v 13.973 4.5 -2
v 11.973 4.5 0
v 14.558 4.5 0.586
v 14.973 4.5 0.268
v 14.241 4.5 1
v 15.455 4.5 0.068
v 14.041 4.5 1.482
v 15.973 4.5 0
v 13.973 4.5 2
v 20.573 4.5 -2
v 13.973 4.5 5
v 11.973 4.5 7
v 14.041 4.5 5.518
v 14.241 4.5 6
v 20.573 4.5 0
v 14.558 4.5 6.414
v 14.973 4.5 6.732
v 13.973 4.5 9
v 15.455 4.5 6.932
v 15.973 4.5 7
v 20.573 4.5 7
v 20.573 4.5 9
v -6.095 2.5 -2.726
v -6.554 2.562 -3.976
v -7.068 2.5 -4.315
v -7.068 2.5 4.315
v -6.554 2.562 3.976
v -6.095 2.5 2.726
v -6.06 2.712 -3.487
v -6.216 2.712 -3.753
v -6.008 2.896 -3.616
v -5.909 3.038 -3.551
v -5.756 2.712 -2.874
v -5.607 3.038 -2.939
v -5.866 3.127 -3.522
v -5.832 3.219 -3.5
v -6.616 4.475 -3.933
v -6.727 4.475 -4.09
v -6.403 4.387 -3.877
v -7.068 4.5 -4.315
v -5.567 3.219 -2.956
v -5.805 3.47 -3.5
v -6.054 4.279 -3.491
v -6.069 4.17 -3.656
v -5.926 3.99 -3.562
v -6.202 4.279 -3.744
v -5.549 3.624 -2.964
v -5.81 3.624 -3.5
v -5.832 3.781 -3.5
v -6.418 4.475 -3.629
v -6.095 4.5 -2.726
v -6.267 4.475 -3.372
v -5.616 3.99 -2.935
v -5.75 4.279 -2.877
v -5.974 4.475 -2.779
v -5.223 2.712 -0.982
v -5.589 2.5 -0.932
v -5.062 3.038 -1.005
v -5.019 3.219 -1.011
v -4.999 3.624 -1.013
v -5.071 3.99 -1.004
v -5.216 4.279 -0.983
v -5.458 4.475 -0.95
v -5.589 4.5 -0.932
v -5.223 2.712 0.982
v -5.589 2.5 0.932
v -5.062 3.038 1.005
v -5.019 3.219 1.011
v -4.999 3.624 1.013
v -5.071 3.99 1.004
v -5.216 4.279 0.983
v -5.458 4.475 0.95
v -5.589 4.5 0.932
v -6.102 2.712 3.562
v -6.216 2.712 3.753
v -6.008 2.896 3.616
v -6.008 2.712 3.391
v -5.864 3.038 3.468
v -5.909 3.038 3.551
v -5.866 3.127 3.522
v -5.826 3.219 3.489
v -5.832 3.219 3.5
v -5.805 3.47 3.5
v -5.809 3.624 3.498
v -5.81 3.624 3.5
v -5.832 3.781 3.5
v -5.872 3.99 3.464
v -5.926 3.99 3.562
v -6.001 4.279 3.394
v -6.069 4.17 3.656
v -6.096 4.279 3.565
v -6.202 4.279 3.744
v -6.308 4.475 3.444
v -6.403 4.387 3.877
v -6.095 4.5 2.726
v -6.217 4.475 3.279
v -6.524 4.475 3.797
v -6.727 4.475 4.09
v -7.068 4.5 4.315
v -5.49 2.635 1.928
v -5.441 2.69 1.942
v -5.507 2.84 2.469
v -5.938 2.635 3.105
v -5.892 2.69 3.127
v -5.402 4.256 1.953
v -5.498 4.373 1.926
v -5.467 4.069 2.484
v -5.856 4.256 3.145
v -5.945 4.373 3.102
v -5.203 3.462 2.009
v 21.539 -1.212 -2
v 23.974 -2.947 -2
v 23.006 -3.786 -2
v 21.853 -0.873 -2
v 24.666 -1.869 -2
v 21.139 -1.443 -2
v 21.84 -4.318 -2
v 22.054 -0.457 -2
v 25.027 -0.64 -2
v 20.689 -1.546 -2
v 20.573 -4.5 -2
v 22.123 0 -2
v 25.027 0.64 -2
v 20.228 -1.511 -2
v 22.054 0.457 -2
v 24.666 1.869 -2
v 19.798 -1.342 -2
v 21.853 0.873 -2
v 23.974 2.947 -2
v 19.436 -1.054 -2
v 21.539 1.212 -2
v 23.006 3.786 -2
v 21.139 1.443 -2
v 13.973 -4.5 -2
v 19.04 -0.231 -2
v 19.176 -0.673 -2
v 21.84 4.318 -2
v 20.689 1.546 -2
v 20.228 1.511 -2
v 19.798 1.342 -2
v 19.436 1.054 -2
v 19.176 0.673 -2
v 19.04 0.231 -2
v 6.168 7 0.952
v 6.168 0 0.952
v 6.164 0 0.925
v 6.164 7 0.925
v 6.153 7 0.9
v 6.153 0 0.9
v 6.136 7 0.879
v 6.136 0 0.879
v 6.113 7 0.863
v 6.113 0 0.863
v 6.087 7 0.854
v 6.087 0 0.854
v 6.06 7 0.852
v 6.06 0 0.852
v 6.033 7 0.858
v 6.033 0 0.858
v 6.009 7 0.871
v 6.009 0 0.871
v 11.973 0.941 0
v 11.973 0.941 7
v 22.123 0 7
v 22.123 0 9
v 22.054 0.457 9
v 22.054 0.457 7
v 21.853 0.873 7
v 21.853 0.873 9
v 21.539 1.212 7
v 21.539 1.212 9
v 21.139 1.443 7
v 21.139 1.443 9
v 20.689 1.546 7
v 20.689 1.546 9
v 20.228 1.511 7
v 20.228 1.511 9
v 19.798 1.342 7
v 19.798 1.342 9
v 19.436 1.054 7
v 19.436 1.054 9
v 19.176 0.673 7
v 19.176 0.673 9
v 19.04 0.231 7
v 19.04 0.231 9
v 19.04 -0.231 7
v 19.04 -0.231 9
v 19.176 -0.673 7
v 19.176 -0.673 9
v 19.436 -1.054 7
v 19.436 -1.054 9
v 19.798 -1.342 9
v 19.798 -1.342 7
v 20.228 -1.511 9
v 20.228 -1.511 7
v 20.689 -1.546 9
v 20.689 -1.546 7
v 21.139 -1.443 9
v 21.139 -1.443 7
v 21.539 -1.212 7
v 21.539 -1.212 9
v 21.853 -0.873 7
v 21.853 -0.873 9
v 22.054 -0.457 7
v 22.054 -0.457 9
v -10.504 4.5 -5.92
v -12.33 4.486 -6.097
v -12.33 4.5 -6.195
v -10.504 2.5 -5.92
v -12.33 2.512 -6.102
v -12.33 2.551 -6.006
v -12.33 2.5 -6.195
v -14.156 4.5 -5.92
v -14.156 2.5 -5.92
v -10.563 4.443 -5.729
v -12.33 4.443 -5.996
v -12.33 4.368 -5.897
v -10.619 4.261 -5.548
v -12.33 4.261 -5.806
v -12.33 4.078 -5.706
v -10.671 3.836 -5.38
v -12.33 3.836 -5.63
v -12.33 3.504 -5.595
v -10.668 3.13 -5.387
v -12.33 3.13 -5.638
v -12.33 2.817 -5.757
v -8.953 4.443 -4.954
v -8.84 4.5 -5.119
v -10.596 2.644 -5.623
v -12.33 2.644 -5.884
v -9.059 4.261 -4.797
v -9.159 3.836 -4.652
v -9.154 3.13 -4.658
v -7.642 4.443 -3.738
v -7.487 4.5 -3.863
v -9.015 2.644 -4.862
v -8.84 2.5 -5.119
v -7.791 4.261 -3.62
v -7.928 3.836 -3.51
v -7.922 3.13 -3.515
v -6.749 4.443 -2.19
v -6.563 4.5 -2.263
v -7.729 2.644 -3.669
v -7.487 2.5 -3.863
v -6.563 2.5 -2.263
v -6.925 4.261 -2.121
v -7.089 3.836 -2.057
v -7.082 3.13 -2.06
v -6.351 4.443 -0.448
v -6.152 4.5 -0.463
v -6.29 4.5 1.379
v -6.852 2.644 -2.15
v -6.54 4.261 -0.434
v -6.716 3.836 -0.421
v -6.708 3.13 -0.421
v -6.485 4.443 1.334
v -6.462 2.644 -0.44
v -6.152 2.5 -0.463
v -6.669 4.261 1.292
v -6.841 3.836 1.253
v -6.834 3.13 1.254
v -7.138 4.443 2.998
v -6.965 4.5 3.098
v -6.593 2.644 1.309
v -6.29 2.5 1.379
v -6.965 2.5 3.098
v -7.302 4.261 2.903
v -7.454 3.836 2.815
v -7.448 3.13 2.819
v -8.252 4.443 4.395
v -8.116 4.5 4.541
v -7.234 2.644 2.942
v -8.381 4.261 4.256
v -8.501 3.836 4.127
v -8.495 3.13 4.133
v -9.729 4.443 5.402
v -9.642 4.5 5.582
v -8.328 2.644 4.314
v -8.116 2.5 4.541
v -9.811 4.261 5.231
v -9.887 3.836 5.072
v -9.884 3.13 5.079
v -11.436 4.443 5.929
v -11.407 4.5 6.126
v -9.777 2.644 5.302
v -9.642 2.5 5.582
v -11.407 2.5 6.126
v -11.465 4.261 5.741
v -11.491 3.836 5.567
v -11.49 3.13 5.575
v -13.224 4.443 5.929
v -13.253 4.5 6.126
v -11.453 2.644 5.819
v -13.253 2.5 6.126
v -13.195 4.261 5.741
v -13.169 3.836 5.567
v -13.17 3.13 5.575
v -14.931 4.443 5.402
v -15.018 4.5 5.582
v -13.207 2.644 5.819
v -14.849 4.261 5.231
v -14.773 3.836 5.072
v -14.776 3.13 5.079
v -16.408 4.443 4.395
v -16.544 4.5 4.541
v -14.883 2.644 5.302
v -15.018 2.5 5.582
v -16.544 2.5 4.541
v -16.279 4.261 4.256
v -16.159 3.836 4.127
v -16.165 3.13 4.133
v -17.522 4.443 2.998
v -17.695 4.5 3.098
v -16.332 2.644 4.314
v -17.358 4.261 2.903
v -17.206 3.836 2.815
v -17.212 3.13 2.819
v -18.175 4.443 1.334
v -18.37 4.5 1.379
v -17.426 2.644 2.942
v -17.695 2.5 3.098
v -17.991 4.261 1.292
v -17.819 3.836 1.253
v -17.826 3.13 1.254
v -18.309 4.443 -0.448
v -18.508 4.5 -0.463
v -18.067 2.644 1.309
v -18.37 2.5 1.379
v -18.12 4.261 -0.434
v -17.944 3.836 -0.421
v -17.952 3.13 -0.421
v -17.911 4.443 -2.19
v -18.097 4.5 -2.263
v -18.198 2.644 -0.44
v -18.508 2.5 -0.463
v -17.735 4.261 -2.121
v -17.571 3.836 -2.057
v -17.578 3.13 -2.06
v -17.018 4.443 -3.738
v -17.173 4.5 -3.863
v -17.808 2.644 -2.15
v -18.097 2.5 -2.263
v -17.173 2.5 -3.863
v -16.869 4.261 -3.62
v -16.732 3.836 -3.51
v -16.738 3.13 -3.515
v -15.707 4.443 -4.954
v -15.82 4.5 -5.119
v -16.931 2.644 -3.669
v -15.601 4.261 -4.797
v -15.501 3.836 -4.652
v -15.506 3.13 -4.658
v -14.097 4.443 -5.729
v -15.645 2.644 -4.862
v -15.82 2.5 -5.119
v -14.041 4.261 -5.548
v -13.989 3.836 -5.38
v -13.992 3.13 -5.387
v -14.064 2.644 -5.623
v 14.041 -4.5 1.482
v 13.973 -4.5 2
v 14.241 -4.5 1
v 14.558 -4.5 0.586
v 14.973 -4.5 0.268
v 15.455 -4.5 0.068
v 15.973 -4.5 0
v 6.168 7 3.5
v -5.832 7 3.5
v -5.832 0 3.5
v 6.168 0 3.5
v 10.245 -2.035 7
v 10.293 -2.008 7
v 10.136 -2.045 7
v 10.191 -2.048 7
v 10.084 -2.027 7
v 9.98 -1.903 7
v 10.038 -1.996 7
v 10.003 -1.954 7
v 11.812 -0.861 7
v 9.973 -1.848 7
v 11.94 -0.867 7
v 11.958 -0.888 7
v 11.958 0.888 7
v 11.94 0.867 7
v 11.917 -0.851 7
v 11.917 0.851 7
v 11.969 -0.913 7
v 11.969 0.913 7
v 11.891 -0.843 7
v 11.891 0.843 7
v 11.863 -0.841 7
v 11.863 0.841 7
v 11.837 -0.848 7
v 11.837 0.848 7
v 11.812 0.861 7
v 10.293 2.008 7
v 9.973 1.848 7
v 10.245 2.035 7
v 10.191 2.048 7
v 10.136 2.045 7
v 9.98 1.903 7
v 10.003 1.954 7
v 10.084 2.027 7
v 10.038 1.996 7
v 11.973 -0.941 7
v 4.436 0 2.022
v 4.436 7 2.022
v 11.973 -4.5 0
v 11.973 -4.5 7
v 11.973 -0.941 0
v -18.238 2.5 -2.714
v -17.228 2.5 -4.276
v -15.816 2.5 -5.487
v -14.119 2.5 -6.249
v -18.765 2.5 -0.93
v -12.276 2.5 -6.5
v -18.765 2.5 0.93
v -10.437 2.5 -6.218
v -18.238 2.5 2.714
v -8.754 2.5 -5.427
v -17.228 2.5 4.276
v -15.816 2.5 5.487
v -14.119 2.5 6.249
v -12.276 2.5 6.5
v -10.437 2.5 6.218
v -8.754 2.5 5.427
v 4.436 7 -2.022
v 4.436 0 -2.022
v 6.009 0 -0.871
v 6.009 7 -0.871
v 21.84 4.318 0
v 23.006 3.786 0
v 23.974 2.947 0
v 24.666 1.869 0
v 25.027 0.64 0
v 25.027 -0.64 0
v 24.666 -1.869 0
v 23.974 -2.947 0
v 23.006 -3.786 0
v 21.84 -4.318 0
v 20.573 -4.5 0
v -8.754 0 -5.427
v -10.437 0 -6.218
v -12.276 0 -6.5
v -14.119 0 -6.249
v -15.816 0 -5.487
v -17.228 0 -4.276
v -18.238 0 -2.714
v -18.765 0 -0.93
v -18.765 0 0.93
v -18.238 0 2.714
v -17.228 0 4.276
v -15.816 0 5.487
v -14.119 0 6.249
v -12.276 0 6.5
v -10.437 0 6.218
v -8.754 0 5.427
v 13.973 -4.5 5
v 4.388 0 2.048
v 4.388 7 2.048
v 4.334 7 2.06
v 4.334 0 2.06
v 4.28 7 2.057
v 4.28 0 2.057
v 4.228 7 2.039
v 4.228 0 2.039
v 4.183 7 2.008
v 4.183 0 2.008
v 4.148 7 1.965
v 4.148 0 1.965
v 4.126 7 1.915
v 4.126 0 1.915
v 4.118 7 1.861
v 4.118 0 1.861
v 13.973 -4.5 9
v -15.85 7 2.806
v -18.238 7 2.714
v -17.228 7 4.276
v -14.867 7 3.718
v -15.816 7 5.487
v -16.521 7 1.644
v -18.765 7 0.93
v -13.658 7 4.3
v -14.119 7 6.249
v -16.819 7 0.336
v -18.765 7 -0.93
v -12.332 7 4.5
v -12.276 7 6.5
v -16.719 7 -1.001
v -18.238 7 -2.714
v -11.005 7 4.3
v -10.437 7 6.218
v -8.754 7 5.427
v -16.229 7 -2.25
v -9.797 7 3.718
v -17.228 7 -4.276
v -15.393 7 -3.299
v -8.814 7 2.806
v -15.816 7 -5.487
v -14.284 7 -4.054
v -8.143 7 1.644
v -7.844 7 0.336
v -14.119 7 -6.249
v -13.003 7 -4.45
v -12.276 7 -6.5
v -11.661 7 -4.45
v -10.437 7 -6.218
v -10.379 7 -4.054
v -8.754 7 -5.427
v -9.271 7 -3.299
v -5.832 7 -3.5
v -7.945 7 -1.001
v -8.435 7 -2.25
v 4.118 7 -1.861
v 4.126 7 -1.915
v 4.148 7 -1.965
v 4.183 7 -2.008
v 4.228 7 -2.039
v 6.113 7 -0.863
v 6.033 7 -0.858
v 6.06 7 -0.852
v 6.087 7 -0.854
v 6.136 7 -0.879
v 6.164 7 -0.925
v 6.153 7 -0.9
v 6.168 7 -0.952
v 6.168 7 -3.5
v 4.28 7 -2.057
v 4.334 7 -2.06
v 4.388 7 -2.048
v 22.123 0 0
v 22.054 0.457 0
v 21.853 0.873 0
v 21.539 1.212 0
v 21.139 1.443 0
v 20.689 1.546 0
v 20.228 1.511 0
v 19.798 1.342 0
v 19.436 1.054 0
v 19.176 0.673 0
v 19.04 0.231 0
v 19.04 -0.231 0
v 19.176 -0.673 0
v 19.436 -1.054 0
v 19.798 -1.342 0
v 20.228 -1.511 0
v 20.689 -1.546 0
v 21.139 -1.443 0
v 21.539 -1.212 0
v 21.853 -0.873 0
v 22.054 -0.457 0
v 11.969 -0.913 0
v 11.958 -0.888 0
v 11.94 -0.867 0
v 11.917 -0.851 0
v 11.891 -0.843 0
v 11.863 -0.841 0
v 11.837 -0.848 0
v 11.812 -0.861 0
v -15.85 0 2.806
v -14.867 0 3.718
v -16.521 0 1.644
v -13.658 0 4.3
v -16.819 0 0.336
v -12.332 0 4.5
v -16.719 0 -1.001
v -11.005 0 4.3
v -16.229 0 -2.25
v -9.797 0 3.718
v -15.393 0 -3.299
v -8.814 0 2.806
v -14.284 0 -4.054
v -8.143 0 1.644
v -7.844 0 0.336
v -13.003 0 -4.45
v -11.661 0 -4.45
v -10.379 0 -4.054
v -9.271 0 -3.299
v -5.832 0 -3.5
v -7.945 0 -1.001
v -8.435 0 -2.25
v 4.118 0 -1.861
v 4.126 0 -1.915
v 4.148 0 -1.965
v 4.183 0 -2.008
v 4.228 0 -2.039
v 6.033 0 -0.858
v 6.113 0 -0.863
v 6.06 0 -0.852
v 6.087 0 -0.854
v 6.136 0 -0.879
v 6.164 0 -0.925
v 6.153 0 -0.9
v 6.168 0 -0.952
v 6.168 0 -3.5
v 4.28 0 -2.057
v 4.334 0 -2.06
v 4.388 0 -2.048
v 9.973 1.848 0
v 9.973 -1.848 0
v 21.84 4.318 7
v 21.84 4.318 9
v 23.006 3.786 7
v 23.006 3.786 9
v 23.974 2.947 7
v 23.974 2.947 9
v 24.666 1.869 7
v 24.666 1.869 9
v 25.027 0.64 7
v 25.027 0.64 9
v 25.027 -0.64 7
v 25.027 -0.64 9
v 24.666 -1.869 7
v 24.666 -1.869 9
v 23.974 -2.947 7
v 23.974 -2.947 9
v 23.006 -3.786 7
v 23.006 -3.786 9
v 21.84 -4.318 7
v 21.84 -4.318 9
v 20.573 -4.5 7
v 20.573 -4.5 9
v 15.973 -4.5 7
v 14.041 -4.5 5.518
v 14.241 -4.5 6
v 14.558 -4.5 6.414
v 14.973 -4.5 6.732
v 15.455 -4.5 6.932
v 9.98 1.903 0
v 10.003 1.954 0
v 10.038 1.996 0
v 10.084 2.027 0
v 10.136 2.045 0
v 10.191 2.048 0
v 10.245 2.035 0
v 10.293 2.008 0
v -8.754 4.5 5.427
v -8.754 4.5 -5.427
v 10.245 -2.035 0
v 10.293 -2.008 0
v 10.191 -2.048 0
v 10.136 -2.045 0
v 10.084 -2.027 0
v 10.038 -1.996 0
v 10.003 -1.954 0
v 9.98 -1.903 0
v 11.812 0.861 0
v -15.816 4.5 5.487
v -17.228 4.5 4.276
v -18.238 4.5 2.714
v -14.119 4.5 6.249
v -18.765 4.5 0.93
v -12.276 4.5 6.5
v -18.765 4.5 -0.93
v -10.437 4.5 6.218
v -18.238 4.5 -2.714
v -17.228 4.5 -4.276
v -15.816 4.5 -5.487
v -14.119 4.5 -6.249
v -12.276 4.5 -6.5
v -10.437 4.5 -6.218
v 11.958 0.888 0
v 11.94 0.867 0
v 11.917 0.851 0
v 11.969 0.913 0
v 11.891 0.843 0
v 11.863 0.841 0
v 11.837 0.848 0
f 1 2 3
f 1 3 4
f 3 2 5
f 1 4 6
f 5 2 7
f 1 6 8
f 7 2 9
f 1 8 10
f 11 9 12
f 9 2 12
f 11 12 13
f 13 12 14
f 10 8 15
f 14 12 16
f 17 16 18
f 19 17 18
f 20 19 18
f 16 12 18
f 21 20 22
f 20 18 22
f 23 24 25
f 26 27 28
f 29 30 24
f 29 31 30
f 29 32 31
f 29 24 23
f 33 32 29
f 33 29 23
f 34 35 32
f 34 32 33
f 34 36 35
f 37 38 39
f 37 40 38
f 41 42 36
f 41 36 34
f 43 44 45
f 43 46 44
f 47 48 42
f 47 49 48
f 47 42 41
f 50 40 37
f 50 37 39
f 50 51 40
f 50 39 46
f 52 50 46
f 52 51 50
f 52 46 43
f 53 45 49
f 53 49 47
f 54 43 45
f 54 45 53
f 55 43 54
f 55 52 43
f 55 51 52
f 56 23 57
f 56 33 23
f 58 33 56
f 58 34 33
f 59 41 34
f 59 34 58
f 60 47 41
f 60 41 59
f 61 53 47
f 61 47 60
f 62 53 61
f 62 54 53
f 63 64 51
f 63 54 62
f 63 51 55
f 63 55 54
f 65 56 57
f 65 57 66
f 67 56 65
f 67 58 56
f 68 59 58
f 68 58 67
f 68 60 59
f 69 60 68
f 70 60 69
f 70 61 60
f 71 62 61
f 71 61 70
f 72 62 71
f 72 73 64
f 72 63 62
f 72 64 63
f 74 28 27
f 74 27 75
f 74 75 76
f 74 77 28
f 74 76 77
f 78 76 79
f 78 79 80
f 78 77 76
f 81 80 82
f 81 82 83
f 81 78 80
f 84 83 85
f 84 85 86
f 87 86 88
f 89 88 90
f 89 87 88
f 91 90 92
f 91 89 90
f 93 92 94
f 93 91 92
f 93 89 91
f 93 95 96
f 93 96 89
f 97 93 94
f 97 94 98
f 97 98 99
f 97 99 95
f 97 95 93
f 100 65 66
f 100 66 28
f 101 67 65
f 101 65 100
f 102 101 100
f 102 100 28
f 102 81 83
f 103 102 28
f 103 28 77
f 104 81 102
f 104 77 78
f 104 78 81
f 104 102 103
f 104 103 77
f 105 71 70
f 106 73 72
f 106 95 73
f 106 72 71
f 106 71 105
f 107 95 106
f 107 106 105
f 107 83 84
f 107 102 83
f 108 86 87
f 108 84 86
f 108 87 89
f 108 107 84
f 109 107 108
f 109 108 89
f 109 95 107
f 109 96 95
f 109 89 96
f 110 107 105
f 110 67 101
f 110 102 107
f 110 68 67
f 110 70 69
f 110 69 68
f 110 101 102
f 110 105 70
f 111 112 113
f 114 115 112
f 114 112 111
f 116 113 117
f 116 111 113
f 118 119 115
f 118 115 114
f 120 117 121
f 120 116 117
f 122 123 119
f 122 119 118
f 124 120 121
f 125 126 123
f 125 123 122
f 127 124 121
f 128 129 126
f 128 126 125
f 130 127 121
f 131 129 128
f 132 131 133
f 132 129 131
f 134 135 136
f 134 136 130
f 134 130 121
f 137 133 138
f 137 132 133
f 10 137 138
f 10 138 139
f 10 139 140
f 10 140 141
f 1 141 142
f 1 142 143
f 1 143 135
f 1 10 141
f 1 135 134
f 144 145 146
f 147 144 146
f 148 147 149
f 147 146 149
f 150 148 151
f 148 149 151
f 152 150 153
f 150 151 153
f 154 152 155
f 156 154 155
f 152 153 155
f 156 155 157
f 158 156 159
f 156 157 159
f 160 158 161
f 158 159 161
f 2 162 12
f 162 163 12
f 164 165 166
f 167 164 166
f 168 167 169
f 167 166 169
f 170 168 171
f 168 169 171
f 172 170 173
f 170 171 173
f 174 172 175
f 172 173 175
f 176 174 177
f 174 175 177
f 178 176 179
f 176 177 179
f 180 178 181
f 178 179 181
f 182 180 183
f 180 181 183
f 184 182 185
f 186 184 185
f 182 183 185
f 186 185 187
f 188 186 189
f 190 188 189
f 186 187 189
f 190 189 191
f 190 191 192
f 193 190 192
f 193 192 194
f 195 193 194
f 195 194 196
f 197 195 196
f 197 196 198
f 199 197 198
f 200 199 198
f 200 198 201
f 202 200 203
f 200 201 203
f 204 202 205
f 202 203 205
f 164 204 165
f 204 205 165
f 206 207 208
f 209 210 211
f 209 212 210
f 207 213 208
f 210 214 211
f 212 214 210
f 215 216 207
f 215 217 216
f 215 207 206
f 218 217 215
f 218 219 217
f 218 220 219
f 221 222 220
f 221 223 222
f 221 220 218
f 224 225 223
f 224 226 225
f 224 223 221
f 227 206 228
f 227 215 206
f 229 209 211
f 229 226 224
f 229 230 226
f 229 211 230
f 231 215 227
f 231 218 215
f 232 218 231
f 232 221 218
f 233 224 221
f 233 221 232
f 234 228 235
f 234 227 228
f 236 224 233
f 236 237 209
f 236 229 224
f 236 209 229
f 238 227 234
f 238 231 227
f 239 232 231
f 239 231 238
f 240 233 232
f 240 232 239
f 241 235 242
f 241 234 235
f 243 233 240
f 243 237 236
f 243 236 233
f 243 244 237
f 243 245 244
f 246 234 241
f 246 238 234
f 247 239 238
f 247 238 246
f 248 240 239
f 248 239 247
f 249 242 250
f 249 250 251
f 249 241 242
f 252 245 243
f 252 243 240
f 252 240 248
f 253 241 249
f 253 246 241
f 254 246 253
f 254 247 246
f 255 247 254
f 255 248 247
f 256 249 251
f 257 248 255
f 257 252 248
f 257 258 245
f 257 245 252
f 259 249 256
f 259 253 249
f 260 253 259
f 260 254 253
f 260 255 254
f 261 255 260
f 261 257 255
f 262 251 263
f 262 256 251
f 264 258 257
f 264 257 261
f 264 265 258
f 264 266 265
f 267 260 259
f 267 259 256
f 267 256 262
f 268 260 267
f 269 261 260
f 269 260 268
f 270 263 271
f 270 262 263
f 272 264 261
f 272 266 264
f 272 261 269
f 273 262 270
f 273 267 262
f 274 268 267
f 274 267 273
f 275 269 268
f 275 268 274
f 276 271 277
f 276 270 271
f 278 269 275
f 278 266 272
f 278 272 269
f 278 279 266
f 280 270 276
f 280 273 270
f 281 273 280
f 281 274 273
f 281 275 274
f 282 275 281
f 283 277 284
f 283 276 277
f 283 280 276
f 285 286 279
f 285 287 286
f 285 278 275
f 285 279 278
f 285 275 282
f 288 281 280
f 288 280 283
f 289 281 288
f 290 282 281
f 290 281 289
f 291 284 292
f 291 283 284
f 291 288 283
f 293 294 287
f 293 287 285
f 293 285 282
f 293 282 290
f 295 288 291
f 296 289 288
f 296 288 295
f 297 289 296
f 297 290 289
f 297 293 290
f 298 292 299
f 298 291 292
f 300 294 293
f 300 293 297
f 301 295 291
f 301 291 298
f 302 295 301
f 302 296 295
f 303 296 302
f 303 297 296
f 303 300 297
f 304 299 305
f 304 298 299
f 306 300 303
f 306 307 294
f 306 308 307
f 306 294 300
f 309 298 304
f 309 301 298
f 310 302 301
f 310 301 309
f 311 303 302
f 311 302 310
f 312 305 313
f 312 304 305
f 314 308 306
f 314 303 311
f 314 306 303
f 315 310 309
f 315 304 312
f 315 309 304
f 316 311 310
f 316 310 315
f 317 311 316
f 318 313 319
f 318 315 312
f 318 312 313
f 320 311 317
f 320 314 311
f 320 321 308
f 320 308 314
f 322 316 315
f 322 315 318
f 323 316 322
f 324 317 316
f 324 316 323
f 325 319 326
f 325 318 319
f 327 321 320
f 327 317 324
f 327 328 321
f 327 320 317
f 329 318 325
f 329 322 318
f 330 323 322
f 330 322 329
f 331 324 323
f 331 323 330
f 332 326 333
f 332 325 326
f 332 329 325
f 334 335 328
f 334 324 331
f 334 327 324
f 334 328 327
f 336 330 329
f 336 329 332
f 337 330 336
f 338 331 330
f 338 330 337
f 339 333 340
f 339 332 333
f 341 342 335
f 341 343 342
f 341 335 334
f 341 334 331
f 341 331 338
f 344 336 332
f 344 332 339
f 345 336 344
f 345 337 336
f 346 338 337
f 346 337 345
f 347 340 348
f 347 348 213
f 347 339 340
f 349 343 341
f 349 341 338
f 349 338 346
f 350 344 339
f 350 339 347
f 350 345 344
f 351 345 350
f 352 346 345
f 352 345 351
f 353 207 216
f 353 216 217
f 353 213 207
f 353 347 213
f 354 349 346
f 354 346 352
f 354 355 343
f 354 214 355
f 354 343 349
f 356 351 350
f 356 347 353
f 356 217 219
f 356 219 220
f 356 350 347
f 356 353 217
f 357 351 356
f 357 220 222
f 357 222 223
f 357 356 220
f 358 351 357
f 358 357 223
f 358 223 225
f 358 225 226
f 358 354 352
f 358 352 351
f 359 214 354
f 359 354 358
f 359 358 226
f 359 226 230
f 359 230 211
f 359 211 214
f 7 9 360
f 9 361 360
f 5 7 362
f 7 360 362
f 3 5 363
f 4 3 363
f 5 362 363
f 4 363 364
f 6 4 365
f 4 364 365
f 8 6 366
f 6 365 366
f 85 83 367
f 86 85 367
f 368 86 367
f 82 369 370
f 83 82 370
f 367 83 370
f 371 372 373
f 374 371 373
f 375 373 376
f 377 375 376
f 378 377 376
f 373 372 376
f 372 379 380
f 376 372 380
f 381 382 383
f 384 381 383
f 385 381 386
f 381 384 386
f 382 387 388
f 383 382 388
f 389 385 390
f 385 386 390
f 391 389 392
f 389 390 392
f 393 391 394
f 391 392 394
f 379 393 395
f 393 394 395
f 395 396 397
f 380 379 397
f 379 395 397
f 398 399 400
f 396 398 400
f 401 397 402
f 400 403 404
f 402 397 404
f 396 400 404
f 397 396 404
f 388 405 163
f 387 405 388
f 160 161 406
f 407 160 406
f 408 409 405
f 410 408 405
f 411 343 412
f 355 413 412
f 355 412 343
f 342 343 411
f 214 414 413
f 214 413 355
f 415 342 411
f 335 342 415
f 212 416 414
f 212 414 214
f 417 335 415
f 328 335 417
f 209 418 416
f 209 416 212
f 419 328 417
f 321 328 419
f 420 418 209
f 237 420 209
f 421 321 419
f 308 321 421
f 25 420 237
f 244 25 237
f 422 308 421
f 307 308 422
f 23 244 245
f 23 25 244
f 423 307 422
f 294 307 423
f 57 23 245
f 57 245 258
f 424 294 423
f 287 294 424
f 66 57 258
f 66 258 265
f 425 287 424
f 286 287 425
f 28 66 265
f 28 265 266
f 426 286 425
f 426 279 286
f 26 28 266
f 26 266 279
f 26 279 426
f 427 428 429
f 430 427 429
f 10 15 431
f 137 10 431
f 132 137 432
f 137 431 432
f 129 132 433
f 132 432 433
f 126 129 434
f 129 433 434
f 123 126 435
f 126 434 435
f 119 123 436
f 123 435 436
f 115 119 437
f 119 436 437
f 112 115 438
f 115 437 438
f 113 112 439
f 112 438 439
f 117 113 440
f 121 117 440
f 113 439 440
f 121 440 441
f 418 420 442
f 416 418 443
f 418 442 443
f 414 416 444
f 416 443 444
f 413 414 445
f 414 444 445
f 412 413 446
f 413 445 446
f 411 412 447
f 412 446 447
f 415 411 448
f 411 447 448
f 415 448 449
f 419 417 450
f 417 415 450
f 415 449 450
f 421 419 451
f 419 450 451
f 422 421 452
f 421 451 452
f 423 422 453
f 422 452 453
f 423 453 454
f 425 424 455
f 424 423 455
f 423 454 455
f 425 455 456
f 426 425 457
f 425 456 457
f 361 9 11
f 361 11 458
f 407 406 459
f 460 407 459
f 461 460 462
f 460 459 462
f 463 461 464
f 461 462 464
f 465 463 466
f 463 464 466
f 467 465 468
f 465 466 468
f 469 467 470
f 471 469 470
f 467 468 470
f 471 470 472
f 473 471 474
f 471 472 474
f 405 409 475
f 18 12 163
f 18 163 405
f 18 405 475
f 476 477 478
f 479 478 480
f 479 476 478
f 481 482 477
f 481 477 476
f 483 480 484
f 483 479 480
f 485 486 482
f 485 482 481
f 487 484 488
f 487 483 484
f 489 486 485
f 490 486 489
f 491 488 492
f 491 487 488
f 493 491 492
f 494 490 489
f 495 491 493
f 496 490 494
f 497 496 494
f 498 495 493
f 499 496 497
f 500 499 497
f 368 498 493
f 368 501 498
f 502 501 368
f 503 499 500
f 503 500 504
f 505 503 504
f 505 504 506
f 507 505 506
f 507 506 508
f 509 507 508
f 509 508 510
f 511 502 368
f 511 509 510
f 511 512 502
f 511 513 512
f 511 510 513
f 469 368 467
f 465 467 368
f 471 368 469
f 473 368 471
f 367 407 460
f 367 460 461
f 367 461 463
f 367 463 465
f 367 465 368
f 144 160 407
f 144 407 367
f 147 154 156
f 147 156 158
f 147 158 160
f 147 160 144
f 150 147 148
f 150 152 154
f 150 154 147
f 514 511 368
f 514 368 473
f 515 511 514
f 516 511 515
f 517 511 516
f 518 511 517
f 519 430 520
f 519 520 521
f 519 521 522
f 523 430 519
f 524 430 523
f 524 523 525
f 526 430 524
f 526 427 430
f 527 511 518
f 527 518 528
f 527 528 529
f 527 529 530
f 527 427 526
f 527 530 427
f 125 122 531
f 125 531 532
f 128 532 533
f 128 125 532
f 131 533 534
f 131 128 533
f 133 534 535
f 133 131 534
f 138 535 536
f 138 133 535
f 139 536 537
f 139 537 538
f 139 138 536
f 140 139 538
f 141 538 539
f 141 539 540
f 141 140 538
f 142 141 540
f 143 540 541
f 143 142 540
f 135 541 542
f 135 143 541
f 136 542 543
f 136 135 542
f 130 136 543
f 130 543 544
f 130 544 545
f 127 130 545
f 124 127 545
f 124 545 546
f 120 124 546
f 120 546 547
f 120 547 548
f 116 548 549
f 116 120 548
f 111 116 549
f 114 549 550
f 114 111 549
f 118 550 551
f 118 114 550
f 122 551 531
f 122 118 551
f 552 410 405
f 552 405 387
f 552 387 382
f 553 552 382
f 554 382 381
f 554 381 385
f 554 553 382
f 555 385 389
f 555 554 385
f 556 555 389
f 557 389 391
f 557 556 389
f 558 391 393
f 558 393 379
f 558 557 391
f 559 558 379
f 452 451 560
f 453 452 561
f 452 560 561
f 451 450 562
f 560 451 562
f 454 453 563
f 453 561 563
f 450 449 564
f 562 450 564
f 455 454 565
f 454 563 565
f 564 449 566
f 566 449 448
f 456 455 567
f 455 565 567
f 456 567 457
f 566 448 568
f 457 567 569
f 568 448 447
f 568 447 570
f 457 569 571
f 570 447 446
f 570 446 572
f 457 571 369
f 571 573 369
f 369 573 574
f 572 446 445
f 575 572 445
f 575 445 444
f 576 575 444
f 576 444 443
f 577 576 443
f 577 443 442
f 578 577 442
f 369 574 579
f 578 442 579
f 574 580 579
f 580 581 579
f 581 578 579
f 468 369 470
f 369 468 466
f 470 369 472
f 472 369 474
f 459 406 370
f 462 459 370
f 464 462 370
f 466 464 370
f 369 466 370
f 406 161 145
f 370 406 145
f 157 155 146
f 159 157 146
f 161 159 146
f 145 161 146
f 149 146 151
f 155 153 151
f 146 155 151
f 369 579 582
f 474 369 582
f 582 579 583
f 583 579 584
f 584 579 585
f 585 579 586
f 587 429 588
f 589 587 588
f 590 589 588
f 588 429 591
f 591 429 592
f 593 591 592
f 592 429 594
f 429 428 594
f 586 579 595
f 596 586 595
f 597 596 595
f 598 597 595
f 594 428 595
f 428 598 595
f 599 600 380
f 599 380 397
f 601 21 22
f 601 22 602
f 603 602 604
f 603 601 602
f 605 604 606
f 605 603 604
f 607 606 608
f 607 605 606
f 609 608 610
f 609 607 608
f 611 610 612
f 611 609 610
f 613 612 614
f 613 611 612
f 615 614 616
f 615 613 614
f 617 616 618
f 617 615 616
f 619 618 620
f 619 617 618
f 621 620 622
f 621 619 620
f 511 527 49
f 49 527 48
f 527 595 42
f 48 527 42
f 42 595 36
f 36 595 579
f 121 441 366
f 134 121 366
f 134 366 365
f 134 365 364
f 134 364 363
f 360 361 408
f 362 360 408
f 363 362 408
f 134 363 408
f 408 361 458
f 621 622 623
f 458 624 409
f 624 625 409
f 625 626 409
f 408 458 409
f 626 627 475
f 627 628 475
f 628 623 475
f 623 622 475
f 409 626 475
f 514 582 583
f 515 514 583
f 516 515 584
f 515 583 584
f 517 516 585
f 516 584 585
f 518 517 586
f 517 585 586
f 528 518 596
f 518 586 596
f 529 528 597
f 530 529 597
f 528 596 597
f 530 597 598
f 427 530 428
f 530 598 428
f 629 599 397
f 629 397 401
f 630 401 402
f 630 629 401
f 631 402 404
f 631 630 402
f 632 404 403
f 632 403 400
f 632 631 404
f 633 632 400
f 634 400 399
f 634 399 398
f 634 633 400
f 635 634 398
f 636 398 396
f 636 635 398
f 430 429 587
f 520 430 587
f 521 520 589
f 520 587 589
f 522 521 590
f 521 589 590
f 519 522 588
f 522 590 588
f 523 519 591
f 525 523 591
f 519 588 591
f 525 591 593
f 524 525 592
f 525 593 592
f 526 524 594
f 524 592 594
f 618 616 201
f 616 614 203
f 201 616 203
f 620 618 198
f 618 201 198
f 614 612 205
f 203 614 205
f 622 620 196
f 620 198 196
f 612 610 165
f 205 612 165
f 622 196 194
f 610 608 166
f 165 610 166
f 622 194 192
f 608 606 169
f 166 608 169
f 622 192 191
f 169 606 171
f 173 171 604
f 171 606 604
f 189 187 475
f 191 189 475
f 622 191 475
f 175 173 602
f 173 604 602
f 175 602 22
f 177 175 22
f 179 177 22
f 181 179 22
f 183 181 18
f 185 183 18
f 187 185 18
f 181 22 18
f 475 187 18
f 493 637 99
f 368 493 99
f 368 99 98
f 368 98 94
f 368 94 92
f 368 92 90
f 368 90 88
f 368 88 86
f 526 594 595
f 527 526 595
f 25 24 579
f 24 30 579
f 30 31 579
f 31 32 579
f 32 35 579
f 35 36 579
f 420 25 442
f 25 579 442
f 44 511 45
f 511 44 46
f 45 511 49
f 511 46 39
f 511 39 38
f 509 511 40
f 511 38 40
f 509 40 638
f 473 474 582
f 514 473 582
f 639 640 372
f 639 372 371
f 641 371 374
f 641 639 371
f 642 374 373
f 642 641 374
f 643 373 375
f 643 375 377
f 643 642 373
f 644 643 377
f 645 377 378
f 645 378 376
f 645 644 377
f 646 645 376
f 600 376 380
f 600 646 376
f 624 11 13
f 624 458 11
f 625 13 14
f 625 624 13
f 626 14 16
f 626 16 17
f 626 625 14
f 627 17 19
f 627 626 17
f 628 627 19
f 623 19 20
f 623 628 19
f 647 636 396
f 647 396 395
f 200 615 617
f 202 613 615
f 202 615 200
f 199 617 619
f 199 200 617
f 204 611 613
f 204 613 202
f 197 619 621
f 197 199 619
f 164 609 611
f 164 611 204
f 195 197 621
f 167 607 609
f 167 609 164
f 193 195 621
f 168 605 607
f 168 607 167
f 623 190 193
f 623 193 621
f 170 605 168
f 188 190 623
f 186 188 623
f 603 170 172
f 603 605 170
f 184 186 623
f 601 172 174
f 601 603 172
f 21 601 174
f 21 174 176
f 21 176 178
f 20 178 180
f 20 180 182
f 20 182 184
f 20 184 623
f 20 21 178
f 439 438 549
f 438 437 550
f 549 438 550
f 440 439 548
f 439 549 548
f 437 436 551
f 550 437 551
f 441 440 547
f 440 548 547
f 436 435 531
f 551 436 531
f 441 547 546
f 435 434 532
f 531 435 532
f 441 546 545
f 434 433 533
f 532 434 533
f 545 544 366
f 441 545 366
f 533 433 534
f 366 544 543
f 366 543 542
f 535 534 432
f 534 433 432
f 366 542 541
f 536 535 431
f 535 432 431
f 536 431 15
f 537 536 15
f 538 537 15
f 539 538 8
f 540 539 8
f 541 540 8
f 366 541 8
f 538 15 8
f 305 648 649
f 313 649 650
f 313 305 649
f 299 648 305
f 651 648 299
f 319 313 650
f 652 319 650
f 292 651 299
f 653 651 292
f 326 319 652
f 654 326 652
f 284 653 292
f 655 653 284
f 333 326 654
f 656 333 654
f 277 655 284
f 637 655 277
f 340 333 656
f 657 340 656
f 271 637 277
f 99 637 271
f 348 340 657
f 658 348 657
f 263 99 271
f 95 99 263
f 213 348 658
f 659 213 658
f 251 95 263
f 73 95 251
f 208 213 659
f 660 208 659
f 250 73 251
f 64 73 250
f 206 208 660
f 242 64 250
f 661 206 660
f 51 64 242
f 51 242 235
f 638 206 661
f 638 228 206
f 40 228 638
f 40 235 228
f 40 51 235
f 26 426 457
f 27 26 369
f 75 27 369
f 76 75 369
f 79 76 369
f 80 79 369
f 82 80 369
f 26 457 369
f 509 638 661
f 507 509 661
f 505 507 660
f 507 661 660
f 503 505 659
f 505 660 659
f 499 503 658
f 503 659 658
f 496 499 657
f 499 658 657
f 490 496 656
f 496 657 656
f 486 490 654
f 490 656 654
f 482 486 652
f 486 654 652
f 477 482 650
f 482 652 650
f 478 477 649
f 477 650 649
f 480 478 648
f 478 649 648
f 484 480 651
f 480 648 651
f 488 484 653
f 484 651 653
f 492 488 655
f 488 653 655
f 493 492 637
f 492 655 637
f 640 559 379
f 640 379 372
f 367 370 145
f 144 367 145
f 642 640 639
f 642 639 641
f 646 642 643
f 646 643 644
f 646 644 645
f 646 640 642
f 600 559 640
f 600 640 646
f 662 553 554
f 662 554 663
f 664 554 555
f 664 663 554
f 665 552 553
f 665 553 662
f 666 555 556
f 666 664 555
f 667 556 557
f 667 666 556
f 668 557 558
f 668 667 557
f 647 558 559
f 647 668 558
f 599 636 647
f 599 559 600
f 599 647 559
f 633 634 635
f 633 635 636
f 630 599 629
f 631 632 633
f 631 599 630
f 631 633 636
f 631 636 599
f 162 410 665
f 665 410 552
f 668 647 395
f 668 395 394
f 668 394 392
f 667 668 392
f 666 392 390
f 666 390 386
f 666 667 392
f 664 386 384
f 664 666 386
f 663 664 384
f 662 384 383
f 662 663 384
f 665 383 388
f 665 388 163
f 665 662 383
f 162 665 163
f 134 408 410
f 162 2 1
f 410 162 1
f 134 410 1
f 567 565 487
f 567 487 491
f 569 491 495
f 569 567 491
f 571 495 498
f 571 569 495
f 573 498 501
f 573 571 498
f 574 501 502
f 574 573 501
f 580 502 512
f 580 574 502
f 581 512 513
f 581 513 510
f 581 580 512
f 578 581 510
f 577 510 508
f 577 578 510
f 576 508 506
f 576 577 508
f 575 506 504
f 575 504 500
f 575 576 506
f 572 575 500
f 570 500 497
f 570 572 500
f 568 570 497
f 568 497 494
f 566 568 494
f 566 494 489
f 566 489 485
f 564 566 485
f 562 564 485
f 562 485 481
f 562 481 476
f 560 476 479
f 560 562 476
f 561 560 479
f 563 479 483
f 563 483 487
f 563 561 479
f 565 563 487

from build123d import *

# Parameters (mm, degrees)
SKETCH2_R            = 4.5
BOSS_EXTRUDE3_DEPTH  = 7
BOSS_EXTRUDE4_DEPTH  = 7
BOSS_EXTRUDE10_DEPTH = 2
CUT_EXTRUDE6_DEPTH   = 29.118300343
FILLET4_R            = 2
SKETCH18_R           = 1.55
CUT_EXTRUDE7_DEPTH   = 2
FILLET6_R            = 2


with BuildPart() as part:
    # Sketch2 → Boss-Extrude3 (new body)
    with BuildSketch(Plane(origin=(0, 0, 0), x_dir=(1, 0, 0), z_dir=(0, 1, 0))):
        with BuildLine():
            Line((6.168188074, -3.5), (6.168188074, -0.952081813))
            ThreePointArc((6.168188074, -0.952081813), (6.113436832, -0.862904742), (6.009137075, -0.87137878))
            Line((6.009137075, -0.87137878), (4.436290073, -2.02224244))
            ThreePointArc((4.436290073, -2.02224244), (4.22769056, -2.039190516), (4.118188074, -1.860836375))
            Line((4.118188074, -1.860836375), (4.118188074, 1.860836375))
            ThreePointArc((4.118188074, 1.860836375), (4.22769056, 2.039190516), (4.436290073, 2.02224244))
            Line((4.436290073, 2.02224244), (6.009137075, 0.87137878))
            ThreePointArc((6.009137075, 0.87137878), (6.113436832, 0.862904742), (6.168188074, 0.952081813))
            Line((6.168188074, 0.952081813), (6.168188074, 3.5))
            Line((6.168188074, 3.5), (-5.831811926, 3.5))
            Line((-5.831811926, 3.5), (-8.753830274, 5.426605505))
            ThreePointArc((-8.753830274, 5.426605505), (-18.831811926, 0), (-8.753830274, -5.426605505))
            Line((-8.753830274, -5.426605505), (-5.831811926, -3.5))
            Line((-5.831811926, -3.5), (6.168188074, -3.5))
        make_face()
        with Locations(Location((-12.331811926, 0, 0), (0, 0, 270))):
            Circle(SKETCH2_R, mode=Mode.SUBTRACT)
    extrude(amount=BOSS_EXTRUDE3_DEPTH)

    # Sketch19 → Cut-Revolve1 (revolve, cut)
    with BuildSketch(Plane(origin=(-12.33, -4.465182267, -12.793633871), x_dir=(0, 1, 0), z_dir=(1, 0, 0))):
        with BuildLine():
            Line((6.965182267, 6.598633871), (6.965182267, 5.988633871))
            add(Edge.make_bspline(
                [(6.965182267, 5.988633871), (6.965182267, 5.388633871), (7.965182267, 5.388633871), (8.965182267, 5.388633871), (8.965182267, 5.988633871)],
                knots=[3.141592654, 3.141592654, 3.141592654, 4.71238898, 4.71238898, 6.283185307, 6.283185307, 6.283185307], degree=2, weights=[1, 0.707106781, 1, 0.707106781, 1]))
            Line((8.965182267, 5.988633871), (8.965182267, 6.598633871))
            add(Edge.make_bspline(
                [(8.965182267, 6.598633871), (8.965182267, 7.198633871), (7.965182267, 7.198633871), (6.965182267, 7.198633871), (6.965182267, 6.598633871)],
                knots=[3.141592654, 3.141592654, 3.141592654, 4.71238898, 4.71238898, 6.283185307, 6.283185307, 6.283185307], degree=2, weights=[1, 0.707106781, 1, 0.707106781, 1]))
        make_face()
    revolve(axis=Axis((-12.33, 7, 0), (0, -1, 0)), mode=Mode.SUBTRACT)


with BuildPart() as body_2:
    # Sketch3 → Boss-Extrude4 (new body)
    with BuildSketch(Plane.XY):
        with BuildLine():
            Line((9.972670663, -1.848398723), (9.972670663, 1.848398723))
            ThreePointArc((9.972670663, 1.848398723), (10.083513588, 2.027426699), (10.293180823, 2.008014829))
            Line((10.293180823, 2.008014829), (11.812415583, 0.860992585))
            ThreePointArc((11.812415583, 0.860992585), (11.9172492, 0.851286651), (11.972670663, 0.940800638))
            Line((11.972670663, 0.940800638), (11.972670663, 4.5))
            Line((11.972670663, 4.5), (13.972670663, 4.5))
            Line((13.972670663, 4.5), (13.972670663, -4.5))
            Line((13.972670663, -4.5), (11.972670663, -4.5))
            Line((11.972670663, -4.5), (11.972670663, -0.940800638))
            ThreePointArc((11.972670663, -0.940800638), (11.9172492, -0.851286651), (11.812415583, -0.860992585))
            Line((11.812415583, -0.860992585), (10.293180823, -2.008014829))
            ThreePointArc((10.293180823, -2.008014829), (10.083513588, -2.027426699), (9.972670663, -1.848398723))
        make_face()
    extrude(amount=BOSS_EXTRUDE4_DEPTH)

    # Sketch15 → Boss-Extrude10 (add)
    with BuildSketch(Plane.XY.offset(7)):
        with BuildLine():
            Line((11.972670663, 4.5), (20.572670663, 4.5))
            ThreePointArc((20.572670663, 4.5), (25.072670663, 0), (20.572670663, -4.5))
            Line((20.572670663, -4.5), (11.972670663, -4.5))
            Line((11.972670663, -4.5), (11.972670663, 4.5))
        make_face()
    boss_extrude10 = extrude(amount=BOSS_EXTRUDE10_DEPTH)

    # Sketch16 → Cut-Extrude6 (cut, through all)
    with BuildSketch(Plane(origin=(0, 4.5, 0), x_dir=(1, 0, 0), z_dir=(0, 1, 0))):
        Polygon((11.972670663, -7), (13.972670663, -9), (11.972670663, -9), align=None)
    cut_extrude6 = extrude(amount=-CUT_EXTRUDE6_DEPTH, mode=Mode.SUBTRACT)

    # Fillet4
    fillet4_edges = [body_2.edges().sort_by_distance(p)[0] for p in [
        (13.972670663, 0, 7),
    ]]
    fillet(fillet4_edges, radius=FILLET4_R)

    # Sketch18 → Cut-Extrude7 (cut)
    with BuildSketch(Plane.XY.offset(9)):
        with Locations((20.572670663, 0)):
            Circle(SKETCH18_R)
    cut_extrude7 = extrude(amount=-CUT_EXTRUDE7_DEPTH, mode=Mode.SUBTRACT)

    # Mirror7: Boss-Extrude10, Cut-Extrude6, Cut-Extrude7 across plane
    add(boss_extrude10.mirror(Plane.XY.offset(3.5)))
    add(cut_extrude6.mirror(Plane.XY.offset(3.5)), mode=Mode.SUBTRACT)
    add(cut_extrude7.mirror(Plane.XY.offset(3.5)), mode=Mode.SUBTRACT)

    # Fillet6
    fillet6_edges = [body_2.edges().sort_by_distance(p)[0] for p in [
        (13.972670663, 0, 0),
    ]]
    fillet(fillet6_edges, radius=FILLET6_R)


solid = Compound([part.part, body_2.part])
